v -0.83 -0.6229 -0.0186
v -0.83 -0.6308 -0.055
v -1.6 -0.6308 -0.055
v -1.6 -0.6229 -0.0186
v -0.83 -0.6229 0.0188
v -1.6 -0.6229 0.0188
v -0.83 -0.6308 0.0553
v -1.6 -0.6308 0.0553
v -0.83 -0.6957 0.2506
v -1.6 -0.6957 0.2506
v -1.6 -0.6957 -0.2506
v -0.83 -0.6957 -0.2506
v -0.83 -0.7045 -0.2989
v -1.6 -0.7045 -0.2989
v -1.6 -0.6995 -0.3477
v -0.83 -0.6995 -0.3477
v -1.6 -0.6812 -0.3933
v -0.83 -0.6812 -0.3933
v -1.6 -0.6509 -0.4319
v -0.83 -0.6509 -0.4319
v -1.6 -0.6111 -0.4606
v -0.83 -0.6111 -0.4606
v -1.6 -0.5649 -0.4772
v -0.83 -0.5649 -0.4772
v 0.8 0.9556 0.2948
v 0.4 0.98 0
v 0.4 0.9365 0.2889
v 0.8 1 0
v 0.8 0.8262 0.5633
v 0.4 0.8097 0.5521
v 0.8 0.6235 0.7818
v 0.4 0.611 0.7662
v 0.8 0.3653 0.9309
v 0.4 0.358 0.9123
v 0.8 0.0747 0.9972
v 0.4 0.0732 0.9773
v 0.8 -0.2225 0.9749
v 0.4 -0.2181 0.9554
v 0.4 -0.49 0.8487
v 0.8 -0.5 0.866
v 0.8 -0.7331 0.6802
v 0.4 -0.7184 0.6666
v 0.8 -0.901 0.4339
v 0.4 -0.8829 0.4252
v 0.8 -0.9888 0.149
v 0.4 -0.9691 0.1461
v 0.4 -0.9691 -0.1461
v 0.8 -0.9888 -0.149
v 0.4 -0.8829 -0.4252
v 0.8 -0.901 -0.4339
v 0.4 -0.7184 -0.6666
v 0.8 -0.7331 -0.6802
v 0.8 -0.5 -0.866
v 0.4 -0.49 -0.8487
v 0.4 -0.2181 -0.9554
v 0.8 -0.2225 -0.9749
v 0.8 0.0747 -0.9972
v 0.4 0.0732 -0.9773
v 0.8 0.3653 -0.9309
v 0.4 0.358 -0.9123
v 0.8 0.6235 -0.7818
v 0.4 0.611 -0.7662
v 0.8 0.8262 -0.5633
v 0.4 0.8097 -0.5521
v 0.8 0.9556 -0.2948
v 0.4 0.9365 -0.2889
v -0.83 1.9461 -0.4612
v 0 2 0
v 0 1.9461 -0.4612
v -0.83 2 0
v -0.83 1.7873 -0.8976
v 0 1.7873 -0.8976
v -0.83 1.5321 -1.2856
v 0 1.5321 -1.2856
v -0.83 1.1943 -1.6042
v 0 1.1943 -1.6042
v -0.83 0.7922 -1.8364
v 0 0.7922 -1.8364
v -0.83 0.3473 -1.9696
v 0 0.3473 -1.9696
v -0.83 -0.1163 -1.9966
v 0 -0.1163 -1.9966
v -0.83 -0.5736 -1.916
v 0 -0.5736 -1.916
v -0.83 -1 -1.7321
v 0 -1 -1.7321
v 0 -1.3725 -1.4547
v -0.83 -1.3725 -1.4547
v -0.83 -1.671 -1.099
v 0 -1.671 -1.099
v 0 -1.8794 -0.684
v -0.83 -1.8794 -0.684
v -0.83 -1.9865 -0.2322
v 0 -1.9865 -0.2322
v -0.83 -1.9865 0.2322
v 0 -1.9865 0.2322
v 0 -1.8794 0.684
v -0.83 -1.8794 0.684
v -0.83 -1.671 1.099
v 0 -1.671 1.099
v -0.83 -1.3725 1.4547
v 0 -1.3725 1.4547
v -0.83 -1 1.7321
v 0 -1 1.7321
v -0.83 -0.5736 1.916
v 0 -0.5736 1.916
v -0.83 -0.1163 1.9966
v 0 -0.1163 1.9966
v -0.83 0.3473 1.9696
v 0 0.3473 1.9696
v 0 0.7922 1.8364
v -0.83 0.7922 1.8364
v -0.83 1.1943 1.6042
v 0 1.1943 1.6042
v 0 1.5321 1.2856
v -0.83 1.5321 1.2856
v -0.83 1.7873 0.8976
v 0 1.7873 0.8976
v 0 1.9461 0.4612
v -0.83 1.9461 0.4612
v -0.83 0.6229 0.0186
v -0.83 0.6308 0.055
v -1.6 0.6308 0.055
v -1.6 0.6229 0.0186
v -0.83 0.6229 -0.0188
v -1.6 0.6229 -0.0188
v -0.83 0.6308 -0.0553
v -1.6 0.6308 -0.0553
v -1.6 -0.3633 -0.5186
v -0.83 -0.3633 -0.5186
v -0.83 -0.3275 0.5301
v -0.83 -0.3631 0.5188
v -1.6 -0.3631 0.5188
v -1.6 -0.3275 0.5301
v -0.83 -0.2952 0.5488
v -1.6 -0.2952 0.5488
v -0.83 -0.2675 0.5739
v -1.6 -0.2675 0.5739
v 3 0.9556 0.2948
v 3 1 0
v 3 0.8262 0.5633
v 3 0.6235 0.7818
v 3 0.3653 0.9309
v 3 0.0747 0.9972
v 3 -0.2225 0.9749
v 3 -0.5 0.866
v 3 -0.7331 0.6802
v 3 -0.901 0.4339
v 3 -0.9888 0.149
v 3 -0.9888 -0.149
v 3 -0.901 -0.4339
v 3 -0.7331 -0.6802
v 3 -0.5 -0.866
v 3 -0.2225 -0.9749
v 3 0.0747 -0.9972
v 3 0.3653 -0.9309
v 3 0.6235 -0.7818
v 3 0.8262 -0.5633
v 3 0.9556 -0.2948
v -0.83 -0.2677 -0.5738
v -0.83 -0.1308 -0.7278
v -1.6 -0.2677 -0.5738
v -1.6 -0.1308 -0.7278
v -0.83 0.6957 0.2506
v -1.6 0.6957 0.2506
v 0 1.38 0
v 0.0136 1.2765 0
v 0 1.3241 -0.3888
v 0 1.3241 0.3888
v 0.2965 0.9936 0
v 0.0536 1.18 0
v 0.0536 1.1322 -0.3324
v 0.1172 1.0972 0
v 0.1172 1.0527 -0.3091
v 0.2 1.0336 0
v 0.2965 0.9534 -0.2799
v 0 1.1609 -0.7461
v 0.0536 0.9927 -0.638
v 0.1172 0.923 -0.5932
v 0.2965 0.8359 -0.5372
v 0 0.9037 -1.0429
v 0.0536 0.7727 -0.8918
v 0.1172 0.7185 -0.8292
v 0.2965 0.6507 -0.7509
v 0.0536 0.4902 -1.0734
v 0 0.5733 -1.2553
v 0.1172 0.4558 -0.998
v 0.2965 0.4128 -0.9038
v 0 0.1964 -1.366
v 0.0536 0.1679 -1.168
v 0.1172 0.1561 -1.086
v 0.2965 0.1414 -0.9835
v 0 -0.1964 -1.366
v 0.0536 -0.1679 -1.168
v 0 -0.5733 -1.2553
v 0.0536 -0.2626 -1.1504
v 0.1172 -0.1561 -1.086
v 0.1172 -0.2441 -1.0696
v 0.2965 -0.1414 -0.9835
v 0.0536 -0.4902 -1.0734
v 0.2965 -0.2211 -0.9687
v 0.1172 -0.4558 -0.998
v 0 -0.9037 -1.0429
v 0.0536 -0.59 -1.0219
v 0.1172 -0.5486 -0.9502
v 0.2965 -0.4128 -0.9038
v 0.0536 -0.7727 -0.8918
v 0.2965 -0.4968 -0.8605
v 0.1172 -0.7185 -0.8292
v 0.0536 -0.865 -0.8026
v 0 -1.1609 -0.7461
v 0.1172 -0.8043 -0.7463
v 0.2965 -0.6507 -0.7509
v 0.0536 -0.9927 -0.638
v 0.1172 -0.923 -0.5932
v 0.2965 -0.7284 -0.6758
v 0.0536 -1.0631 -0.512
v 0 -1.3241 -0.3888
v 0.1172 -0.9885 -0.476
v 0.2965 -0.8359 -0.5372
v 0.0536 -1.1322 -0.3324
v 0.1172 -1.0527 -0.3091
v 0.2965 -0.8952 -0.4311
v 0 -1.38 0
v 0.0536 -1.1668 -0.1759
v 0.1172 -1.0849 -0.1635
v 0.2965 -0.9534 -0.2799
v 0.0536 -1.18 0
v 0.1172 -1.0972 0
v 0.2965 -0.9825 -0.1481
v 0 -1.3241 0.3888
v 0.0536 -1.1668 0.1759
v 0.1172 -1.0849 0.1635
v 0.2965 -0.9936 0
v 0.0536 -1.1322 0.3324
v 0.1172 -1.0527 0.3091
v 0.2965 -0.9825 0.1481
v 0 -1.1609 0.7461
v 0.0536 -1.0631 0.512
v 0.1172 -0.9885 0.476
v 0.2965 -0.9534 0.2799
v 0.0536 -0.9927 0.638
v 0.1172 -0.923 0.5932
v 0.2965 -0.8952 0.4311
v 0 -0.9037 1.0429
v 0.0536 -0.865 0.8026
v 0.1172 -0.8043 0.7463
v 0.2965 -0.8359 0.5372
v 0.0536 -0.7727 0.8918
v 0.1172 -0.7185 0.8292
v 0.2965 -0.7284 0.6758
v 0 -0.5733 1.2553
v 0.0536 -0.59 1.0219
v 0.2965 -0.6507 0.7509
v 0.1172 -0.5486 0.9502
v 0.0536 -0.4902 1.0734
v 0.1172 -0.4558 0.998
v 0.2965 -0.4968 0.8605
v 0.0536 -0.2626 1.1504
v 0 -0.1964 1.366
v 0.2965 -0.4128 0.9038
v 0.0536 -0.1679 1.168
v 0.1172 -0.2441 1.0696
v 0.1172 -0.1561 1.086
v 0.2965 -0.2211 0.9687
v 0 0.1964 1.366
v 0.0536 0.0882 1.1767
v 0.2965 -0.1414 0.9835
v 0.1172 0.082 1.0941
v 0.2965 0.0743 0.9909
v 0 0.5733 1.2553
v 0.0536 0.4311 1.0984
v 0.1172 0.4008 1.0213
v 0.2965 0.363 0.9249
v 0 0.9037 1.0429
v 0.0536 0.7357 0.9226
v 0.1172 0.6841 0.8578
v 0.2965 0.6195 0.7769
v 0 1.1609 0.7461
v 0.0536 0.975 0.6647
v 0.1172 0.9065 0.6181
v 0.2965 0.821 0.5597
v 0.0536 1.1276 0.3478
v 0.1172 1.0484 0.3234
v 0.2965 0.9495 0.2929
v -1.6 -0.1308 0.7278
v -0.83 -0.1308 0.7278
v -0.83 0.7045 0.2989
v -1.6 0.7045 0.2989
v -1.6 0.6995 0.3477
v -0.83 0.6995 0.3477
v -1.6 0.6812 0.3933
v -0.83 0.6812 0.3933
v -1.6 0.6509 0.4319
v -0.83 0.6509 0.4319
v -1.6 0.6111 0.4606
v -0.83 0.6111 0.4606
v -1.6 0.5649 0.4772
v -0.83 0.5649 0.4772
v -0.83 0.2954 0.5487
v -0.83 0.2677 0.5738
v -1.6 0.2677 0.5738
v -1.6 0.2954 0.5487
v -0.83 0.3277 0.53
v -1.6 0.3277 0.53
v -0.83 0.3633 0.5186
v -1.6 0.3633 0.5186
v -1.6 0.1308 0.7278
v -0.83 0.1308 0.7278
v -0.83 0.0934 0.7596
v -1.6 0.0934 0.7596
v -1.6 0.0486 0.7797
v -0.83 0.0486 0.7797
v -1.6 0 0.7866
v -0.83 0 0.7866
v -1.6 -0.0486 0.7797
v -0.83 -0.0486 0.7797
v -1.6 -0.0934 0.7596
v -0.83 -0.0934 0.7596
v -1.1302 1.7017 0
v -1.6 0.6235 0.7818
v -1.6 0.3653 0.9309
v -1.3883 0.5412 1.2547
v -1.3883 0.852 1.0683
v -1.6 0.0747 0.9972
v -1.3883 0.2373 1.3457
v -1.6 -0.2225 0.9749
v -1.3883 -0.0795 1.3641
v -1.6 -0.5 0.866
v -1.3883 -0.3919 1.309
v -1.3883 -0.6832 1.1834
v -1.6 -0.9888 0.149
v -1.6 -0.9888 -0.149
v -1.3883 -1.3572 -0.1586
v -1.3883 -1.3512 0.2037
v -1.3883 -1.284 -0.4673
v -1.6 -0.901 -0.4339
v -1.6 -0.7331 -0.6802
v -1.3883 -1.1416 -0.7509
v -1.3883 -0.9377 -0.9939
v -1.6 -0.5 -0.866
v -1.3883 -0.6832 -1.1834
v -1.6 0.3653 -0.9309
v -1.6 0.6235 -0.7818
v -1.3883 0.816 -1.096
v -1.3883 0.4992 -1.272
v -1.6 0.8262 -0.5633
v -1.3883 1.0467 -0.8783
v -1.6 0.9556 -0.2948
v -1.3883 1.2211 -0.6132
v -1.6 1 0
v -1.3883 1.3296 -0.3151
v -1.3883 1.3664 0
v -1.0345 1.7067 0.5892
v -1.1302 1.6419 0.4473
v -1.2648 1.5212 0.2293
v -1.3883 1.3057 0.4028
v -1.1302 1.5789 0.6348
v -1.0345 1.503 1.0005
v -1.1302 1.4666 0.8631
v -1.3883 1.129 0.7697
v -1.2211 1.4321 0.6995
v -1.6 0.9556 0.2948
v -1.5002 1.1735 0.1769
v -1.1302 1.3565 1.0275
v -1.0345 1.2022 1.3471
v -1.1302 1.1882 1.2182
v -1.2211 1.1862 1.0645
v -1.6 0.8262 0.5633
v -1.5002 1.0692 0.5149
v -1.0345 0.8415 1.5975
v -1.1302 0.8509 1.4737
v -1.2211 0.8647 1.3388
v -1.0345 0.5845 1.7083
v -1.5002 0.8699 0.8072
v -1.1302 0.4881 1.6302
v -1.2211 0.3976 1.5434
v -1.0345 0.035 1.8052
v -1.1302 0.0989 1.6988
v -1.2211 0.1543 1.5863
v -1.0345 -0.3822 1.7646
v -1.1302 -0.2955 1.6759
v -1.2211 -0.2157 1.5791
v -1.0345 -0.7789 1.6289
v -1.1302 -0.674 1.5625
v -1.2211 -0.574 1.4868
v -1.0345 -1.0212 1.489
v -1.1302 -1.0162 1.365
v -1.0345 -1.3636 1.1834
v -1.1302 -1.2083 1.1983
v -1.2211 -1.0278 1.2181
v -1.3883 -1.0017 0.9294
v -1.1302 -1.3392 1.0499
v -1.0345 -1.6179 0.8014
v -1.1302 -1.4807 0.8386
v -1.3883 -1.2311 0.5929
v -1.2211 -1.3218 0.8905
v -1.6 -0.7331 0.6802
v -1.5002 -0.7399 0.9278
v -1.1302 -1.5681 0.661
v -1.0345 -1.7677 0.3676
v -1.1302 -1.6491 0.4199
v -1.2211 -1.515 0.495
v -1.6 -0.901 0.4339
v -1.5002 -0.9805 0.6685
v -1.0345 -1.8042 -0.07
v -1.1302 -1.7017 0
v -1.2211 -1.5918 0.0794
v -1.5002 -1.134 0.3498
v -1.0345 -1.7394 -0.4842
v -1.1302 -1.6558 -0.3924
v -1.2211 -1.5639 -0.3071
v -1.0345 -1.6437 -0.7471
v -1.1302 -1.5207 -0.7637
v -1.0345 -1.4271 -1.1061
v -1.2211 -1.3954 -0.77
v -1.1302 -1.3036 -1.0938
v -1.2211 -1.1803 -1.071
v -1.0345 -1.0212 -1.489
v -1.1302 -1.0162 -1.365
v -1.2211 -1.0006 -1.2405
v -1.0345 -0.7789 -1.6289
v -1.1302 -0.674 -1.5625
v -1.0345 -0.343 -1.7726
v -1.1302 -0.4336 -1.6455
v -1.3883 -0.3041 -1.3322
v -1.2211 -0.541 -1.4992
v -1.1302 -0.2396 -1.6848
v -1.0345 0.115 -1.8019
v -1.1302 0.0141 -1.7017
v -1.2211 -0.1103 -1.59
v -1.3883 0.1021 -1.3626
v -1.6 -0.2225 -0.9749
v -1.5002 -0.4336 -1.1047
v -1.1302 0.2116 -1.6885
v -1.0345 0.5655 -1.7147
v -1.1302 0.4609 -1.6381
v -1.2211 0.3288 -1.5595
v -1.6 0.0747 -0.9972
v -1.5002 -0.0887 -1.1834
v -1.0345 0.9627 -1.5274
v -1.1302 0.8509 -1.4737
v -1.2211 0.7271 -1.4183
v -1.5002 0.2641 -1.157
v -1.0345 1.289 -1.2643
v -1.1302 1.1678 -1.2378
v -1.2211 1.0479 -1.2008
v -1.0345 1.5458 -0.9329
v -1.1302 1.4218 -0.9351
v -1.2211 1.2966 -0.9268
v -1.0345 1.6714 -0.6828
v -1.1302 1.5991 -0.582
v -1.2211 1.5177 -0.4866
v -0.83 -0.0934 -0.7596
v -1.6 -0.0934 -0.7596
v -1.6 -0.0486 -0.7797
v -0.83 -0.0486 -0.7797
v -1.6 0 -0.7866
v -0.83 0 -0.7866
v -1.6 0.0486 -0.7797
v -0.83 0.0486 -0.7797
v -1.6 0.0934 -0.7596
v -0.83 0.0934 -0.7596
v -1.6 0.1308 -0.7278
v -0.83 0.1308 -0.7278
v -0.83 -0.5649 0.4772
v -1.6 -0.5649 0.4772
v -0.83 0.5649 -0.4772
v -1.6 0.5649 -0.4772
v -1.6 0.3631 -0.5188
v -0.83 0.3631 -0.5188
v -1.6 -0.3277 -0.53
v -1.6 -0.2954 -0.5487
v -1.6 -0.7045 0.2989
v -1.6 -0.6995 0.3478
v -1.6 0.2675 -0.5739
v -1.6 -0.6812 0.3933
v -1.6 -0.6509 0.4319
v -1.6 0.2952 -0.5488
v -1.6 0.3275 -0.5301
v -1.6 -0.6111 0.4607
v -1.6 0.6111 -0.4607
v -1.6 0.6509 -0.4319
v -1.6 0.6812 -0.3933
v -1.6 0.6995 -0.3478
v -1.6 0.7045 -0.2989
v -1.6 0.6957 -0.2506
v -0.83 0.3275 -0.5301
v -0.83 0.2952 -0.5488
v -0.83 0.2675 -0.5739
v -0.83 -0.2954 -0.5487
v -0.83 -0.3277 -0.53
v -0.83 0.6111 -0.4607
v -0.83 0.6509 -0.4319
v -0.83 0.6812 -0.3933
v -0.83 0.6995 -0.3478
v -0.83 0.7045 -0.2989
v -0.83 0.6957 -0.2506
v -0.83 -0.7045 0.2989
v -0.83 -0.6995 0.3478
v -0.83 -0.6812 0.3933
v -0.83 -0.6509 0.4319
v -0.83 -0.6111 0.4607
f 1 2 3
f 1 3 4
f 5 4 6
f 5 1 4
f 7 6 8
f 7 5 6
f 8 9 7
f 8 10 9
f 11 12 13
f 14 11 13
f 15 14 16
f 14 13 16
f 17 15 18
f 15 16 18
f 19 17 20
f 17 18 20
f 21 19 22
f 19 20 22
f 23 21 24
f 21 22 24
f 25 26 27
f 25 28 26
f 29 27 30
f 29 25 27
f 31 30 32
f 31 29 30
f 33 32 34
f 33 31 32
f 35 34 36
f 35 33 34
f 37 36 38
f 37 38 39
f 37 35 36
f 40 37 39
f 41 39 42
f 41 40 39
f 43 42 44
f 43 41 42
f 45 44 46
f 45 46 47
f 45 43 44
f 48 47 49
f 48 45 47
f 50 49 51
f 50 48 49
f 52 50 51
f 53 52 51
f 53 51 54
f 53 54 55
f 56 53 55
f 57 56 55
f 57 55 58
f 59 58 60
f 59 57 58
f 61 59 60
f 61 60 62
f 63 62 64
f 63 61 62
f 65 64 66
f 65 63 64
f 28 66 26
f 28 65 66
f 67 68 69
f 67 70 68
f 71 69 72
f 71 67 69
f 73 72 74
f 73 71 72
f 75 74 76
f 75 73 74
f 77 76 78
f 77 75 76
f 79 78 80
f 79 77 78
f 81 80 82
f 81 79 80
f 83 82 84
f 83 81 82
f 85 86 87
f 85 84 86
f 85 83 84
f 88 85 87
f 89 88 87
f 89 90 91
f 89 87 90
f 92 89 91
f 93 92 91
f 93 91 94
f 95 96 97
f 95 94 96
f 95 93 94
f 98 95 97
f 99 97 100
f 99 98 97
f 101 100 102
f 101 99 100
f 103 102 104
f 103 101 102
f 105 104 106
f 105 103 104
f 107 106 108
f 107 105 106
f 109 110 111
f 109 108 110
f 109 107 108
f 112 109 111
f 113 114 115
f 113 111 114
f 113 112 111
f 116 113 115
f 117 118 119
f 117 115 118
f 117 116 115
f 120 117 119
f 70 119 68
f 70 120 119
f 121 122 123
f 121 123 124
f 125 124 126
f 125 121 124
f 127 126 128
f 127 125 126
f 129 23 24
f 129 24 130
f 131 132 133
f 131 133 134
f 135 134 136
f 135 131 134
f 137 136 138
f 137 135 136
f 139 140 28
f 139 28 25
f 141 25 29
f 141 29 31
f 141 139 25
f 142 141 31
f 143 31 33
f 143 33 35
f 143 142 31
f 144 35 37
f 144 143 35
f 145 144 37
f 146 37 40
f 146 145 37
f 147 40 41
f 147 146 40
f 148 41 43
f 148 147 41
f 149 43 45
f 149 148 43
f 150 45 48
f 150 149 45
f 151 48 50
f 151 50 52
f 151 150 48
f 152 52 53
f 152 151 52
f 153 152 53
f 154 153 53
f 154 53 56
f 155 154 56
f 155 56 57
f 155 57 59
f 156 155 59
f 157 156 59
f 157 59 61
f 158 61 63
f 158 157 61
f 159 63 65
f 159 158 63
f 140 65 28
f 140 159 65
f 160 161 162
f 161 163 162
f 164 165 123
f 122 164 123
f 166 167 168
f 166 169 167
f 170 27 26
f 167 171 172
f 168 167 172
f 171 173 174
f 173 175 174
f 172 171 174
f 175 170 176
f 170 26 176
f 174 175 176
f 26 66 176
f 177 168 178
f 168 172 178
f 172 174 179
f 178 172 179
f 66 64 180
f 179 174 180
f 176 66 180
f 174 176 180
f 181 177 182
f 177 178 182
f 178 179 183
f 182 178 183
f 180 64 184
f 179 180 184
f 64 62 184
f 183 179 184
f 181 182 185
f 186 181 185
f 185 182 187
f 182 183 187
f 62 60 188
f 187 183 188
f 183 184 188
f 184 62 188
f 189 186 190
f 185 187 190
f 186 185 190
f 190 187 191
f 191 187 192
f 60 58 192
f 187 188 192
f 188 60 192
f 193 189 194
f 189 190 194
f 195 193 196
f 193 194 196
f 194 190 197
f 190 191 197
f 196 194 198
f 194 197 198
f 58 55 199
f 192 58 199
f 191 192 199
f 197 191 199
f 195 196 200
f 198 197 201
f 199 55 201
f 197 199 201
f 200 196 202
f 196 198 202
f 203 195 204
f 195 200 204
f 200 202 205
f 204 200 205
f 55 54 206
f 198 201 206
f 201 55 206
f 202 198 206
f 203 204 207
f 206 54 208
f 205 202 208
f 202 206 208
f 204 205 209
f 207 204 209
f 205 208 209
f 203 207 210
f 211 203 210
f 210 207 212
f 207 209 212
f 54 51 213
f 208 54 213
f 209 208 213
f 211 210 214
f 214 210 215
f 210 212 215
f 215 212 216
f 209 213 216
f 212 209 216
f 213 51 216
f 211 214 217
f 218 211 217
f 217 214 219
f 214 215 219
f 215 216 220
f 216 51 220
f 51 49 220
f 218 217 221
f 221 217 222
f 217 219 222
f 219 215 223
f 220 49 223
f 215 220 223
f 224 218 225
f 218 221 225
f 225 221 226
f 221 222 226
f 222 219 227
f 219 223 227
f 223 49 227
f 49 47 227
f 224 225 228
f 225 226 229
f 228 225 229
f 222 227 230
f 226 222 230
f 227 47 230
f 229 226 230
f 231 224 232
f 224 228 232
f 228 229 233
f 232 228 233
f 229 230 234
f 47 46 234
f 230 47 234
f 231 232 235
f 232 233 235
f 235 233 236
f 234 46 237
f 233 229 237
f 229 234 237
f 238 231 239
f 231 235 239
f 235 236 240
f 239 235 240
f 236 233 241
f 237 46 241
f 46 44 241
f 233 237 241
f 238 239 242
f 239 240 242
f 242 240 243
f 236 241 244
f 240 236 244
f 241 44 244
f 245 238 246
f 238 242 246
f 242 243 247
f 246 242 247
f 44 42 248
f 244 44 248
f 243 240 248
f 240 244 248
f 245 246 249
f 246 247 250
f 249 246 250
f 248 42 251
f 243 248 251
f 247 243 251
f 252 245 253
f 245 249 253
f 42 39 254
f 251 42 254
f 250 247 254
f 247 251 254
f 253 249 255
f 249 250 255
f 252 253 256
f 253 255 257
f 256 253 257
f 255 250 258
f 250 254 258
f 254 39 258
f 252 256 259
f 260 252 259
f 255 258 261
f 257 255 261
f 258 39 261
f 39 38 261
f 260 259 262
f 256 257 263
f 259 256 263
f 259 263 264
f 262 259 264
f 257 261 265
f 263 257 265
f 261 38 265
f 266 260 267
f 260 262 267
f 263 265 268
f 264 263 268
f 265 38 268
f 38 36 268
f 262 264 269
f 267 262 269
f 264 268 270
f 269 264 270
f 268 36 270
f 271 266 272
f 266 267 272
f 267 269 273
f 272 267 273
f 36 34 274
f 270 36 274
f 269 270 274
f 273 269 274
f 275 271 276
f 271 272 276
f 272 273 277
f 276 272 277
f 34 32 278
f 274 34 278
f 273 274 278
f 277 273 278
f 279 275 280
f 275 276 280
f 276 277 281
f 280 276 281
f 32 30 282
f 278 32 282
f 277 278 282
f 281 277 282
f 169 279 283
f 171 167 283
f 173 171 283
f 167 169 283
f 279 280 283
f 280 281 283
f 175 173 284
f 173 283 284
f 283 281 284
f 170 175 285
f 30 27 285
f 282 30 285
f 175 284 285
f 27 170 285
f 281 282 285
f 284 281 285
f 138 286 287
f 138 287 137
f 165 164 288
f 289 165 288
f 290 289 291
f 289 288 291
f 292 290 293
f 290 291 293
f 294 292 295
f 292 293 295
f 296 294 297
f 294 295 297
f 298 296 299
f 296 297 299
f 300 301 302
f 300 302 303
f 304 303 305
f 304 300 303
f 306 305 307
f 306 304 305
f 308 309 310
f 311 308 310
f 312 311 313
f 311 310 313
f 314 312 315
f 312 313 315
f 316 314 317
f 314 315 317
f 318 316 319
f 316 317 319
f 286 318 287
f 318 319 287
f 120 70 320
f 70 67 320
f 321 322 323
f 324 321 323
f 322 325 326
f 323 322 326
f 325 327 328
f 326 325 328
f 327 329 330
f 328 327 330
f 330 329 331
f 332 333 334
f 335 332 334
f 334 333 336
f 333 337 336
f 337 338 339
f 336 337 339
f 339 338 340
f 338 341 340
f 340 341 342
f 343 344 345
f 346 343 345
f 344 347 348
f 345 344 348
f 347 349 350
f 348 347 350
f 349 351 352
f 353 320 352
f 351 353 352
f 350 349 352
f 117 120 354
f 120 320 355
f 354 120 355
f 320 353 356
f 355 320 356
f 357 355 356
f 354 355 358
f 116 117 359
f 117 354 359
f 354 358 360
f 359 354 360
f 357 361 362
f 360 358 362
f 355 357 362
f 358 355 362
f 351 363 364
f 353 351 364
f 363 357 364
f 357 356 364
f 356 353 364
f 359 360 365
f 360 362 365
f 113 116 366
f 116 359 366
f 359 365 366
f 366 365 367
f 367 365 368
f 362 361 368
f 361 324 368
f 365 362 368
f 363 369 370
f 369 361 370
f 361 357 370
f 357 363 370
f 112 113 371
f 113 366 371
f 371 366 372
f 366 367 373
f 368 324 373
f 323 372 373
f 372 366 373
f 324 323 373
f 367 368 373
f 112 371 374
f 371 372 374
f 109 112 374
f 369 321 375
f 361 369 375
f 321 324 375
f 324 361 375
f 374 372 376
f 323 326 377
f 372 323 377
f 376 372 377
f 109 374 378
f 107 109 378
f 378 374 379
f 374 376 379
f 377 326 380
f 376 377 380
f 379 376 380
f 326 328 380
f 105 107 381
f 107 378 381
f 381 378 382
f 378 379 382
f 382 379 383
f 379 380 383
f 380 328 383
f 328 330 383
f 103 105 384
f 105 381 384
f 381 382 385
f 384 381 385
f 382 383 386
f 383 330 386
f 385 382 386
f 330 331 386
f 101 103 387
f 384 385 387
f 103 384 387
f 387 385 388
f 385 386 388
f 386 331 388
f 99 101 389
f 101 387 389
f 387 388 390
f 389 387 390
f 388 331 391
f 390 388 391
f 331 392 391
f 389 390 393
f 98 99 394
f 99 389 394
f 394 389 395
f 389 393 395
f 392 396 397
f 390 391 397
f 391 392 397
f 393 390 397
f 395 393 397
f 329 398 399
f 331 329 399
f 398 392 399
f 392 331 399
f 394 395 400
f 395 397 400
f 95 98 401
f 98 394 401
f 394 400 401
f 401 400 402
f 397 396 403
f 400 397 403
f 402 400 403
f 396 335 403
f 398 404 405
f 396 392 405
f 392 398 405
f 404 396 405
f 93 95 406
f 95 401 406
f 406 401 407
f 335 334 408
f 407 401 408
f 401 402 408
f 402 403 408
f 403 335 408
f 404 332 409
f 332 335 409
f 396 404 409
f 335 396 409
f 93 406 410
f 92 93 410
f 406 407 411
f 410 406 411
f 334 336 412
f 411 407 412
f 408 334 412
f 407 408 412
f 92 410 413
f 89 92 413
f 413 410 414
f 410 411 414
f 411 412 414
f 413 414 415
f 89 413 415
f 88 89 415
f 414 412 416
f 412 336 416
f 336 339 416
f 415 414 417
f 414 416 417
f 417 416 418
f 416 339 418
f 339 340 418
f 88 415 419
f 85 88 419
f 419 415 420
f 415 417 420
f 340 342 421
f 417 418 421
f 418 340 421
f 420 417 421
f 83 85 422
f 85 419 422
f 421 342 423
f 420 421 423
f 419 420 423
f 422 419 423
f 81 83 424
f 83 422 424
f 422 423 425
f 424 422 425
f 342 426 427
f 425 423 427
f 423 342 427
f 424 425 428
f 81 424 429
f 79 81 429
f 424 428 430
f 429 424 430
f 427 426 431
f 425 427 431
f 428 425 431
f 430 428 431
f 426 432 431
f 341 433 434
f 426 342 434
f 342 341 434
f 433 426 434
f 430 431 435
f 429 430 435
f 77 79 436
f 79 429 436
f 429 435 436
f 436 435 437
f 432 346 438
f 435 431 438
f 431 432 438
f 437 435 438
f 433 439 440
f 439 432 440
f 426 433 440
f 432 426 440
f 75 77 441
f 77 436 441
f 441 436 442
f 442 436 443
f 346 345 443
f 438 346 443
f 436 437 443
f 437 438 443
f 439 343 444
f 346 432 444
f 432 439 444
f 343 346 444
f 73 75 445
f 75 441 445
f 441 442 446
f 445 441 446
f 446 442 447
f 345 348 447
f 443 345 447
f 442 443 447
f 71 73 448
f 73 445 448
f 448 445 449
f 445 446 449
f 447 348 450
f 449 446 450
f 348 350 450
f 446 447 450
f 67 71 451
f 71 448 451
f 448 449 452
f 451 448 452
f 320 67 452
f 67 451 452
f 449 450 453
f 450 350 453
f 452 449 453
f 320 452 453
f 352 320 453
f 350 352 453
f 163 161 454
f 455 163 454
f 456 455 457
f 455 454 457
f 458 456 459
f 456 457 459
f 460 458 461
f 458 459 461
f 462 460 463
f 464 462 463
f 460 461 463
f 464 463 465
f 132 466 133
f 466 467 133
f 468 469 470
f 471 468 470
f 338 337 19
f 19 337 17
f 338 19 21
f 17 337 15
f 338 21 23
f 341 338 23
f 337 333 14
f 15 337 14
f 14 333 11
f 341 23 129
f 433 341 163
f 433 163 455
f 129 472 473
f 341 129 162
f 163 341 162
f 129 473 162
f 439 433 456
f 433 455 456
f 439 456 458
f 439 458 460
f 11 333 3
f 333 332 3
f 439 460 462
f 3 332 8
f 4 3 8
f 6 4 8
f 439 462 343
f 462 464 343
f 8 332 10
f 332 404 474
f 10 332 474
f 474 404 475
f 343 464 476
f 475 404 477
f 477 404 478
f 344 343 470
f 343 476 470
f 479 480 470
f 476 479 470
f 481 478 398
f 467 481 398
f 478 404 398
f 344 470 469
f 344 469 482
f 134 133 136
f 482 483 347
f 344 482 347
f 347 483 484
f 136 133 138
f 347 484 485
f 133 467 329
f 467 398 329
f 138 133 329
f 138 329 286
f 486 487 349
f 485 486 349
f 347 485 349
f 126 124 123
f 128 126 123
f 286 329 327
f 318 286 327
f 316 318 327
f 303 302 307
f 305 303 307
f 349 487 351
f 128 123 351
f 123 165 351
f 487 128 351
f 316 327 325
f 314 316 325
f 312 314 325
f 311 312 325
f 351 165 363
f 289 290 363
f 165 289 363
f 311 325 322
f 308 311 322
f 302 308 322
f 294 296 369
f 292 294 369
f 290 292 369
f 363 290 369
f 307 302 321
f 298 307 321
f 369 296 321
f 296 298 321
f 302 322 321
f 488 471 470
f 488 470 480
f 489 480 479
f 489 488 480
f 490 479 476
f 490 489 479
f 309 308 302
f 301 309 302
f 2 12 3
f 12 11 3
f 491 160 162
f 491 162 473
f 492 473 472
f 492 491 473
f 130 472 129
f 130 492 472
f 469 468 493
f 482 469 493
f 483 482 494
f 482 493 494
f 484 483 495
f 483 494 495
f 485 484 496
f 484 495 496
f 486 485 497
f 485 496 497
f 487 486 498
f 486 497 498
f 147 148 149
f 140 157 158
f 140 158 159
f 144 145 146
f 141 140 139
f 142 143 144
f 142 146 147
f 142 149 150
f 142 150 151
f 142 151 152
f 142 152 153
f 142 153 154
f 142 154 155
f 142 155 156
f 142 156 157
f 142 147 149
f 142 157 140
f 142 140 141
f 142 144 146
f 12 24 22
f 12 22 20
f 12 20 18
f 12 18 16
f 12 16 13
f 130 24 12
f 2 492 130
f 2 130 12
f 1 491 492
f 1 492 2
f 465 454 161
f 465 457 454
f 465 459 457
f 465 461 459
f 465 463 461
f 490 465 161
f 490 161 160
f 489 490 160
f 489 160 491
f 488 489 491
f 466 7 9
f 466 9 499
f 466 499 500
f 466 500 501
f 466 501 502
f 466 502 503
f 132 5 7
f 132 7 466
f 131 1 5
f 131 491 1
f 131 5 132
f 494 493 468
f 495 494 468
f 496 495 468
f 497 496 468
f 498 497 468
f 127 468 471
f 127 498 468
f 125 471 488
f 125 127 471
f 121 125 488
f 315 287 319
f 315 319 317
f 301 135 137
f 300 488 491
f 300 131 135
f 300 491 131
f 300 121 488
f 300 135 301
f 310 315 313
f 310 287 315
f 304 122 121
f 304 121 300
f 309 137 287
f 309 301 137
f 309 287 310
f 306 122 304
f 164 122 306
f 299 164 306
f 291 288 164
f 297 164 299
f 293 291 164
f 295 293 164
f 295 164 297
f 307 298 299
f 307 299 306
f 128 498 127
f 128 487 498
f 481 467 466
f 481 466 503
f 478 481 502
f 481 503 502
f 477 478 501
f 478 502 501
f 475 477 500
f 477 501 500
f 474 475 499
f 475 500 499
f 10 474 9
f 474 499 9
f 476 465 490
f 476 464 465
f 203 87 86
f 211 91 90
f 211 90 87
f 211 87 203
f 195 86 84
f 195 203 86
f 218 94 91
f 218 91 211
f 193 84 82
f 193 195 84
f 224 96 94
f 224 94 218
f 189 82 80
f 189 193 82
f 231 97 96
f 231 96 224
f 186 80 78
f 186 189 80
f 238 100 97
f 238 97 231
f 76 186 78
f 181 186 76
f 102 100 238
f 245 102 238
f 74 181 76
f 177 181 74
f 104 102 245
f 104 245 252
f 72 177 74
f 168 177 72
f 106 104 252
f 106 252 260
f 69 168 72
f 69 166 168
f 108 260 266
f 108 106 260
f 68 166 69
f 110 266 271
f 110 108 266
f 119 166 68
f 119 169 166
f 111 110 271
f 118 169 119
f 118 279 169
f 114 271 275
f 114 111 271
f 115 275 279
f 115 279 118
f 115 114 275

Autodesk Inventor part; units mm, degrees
ref_plane "YZ Plane" through (0, 0, 0) normal (1, 0, 0) x (0, 1, 0)
ref_plane "XZ Plane" through (0, 0, 0) normal (0, 1, 0) x (-1, 0, 0)
ref_plane "XY Plane" through (0, 0, 0) normal (0, 0, 1) x (1, 0, 0)
sketch "Sketch4" plane through (0, 0, 0) normal (0, 0, 1) x (1, 0, 0)
  line L0 (-1.6, 0) -> (3, 0)
  line L1 (0, 0) -> (-1.6, 0)
  line L2 (0, 2) -> (0, 1.38)
  line L3 (0.4, 0.98) -> (0.4, 0.98)
  line L4 (0.4, 0.98) -> (0.8, 1)
  arc A0 (0, 1.38) -> (0.4, 0.98) centre (0.4, 1.38) ccw
  line L5 (-1.6, 0) -> (-1.6, 1)
  line L6 (0, 2) -> (-0.83, 2)
  arc A1 (-0.83, 2) -> (-1.6, 1) centre (1.2707, -0.414) ccw
  line L7 (0.8, 1) -> (3, 1)
  line L8 (3, 1) -> (3, 0)
  point P0 (0, 0.98)
  dimension "d71" = 0.4
  dimension "d72" = 3
  dimension "d74" = 0.4
  dimension "d75" = 1.96
  dimension "d78" = 2
  dimension "d82" = 3.2
  dimension "d83" = 1.6
  dimension "d84" = 4
  dimension "d104" = 2.2
  dimension "d105" = 2
revolve "Revolution7" add sketch "Sketch4" angle 360 about axis through (-1.6, 0, 0) along (1, 0, 0)
sketch "Sketch5" plane through (-1.6, 0, 0) normal (-1, 0, 0) x (0, 0, 1)
  circle A0 centre (0, 0) radius 0.875 construction
  circle A1 centre (0, 0) radius 0.6125 construction
  line L0 (0, 0) -> (-0.5304, 0.3062)
  line L1 (0, 0) -> (-0.5304, -0.3063)
  line L2 (-1.8008, 0) -> (1.7887, 0)
  line L3 (-0.875, 0) -> (-0.5304, -0.3063)
  line L4 (-0.875, 0) -> (-0.5304, 0.3062)
  point P0 (0, 0)
  dimension "d88" = 1.75
  dimension "d89" = 1.225
  dimension "d90" = 30
  dimension "d91" = 30
extrude "Extrusion1" cut sketch "Sketch5" against normal blind 0.77
pattern_circular "Circular Pattern1" count 6 over 360 about axis through (-10, 0, 0) along (1, 0, 0) of "Extrusion1"
fillet "Fillet1" radius 0.175 12 edges at (-1.215, -0.7578, -0.4375) (-1.215, -0.3063, -0.5304) (-1.215, -0.6125, 0) (-1.215, -0.7578, 0.4375) (-1.215, -0.3062, 0.5304) (-1.215, 0, 0.875) (-1.215, 0.6125, 0) (-1.215, 0.7578, 0.4375) (-1.215, 0.3063, 0.5304) (-1.215, 0.3062, -0.5304) (-1.215, 0, -0.875) (-1.215, 0.7578, -0.4375)
thread "Thread7" size "M2x0.4" class "6g" standard "ISO Metric profile" length 2.2
properties part number "Flachkopfschraube mit Innenrund ISO 14583 - M2 x 3 - 4.8" material "Stahl"
